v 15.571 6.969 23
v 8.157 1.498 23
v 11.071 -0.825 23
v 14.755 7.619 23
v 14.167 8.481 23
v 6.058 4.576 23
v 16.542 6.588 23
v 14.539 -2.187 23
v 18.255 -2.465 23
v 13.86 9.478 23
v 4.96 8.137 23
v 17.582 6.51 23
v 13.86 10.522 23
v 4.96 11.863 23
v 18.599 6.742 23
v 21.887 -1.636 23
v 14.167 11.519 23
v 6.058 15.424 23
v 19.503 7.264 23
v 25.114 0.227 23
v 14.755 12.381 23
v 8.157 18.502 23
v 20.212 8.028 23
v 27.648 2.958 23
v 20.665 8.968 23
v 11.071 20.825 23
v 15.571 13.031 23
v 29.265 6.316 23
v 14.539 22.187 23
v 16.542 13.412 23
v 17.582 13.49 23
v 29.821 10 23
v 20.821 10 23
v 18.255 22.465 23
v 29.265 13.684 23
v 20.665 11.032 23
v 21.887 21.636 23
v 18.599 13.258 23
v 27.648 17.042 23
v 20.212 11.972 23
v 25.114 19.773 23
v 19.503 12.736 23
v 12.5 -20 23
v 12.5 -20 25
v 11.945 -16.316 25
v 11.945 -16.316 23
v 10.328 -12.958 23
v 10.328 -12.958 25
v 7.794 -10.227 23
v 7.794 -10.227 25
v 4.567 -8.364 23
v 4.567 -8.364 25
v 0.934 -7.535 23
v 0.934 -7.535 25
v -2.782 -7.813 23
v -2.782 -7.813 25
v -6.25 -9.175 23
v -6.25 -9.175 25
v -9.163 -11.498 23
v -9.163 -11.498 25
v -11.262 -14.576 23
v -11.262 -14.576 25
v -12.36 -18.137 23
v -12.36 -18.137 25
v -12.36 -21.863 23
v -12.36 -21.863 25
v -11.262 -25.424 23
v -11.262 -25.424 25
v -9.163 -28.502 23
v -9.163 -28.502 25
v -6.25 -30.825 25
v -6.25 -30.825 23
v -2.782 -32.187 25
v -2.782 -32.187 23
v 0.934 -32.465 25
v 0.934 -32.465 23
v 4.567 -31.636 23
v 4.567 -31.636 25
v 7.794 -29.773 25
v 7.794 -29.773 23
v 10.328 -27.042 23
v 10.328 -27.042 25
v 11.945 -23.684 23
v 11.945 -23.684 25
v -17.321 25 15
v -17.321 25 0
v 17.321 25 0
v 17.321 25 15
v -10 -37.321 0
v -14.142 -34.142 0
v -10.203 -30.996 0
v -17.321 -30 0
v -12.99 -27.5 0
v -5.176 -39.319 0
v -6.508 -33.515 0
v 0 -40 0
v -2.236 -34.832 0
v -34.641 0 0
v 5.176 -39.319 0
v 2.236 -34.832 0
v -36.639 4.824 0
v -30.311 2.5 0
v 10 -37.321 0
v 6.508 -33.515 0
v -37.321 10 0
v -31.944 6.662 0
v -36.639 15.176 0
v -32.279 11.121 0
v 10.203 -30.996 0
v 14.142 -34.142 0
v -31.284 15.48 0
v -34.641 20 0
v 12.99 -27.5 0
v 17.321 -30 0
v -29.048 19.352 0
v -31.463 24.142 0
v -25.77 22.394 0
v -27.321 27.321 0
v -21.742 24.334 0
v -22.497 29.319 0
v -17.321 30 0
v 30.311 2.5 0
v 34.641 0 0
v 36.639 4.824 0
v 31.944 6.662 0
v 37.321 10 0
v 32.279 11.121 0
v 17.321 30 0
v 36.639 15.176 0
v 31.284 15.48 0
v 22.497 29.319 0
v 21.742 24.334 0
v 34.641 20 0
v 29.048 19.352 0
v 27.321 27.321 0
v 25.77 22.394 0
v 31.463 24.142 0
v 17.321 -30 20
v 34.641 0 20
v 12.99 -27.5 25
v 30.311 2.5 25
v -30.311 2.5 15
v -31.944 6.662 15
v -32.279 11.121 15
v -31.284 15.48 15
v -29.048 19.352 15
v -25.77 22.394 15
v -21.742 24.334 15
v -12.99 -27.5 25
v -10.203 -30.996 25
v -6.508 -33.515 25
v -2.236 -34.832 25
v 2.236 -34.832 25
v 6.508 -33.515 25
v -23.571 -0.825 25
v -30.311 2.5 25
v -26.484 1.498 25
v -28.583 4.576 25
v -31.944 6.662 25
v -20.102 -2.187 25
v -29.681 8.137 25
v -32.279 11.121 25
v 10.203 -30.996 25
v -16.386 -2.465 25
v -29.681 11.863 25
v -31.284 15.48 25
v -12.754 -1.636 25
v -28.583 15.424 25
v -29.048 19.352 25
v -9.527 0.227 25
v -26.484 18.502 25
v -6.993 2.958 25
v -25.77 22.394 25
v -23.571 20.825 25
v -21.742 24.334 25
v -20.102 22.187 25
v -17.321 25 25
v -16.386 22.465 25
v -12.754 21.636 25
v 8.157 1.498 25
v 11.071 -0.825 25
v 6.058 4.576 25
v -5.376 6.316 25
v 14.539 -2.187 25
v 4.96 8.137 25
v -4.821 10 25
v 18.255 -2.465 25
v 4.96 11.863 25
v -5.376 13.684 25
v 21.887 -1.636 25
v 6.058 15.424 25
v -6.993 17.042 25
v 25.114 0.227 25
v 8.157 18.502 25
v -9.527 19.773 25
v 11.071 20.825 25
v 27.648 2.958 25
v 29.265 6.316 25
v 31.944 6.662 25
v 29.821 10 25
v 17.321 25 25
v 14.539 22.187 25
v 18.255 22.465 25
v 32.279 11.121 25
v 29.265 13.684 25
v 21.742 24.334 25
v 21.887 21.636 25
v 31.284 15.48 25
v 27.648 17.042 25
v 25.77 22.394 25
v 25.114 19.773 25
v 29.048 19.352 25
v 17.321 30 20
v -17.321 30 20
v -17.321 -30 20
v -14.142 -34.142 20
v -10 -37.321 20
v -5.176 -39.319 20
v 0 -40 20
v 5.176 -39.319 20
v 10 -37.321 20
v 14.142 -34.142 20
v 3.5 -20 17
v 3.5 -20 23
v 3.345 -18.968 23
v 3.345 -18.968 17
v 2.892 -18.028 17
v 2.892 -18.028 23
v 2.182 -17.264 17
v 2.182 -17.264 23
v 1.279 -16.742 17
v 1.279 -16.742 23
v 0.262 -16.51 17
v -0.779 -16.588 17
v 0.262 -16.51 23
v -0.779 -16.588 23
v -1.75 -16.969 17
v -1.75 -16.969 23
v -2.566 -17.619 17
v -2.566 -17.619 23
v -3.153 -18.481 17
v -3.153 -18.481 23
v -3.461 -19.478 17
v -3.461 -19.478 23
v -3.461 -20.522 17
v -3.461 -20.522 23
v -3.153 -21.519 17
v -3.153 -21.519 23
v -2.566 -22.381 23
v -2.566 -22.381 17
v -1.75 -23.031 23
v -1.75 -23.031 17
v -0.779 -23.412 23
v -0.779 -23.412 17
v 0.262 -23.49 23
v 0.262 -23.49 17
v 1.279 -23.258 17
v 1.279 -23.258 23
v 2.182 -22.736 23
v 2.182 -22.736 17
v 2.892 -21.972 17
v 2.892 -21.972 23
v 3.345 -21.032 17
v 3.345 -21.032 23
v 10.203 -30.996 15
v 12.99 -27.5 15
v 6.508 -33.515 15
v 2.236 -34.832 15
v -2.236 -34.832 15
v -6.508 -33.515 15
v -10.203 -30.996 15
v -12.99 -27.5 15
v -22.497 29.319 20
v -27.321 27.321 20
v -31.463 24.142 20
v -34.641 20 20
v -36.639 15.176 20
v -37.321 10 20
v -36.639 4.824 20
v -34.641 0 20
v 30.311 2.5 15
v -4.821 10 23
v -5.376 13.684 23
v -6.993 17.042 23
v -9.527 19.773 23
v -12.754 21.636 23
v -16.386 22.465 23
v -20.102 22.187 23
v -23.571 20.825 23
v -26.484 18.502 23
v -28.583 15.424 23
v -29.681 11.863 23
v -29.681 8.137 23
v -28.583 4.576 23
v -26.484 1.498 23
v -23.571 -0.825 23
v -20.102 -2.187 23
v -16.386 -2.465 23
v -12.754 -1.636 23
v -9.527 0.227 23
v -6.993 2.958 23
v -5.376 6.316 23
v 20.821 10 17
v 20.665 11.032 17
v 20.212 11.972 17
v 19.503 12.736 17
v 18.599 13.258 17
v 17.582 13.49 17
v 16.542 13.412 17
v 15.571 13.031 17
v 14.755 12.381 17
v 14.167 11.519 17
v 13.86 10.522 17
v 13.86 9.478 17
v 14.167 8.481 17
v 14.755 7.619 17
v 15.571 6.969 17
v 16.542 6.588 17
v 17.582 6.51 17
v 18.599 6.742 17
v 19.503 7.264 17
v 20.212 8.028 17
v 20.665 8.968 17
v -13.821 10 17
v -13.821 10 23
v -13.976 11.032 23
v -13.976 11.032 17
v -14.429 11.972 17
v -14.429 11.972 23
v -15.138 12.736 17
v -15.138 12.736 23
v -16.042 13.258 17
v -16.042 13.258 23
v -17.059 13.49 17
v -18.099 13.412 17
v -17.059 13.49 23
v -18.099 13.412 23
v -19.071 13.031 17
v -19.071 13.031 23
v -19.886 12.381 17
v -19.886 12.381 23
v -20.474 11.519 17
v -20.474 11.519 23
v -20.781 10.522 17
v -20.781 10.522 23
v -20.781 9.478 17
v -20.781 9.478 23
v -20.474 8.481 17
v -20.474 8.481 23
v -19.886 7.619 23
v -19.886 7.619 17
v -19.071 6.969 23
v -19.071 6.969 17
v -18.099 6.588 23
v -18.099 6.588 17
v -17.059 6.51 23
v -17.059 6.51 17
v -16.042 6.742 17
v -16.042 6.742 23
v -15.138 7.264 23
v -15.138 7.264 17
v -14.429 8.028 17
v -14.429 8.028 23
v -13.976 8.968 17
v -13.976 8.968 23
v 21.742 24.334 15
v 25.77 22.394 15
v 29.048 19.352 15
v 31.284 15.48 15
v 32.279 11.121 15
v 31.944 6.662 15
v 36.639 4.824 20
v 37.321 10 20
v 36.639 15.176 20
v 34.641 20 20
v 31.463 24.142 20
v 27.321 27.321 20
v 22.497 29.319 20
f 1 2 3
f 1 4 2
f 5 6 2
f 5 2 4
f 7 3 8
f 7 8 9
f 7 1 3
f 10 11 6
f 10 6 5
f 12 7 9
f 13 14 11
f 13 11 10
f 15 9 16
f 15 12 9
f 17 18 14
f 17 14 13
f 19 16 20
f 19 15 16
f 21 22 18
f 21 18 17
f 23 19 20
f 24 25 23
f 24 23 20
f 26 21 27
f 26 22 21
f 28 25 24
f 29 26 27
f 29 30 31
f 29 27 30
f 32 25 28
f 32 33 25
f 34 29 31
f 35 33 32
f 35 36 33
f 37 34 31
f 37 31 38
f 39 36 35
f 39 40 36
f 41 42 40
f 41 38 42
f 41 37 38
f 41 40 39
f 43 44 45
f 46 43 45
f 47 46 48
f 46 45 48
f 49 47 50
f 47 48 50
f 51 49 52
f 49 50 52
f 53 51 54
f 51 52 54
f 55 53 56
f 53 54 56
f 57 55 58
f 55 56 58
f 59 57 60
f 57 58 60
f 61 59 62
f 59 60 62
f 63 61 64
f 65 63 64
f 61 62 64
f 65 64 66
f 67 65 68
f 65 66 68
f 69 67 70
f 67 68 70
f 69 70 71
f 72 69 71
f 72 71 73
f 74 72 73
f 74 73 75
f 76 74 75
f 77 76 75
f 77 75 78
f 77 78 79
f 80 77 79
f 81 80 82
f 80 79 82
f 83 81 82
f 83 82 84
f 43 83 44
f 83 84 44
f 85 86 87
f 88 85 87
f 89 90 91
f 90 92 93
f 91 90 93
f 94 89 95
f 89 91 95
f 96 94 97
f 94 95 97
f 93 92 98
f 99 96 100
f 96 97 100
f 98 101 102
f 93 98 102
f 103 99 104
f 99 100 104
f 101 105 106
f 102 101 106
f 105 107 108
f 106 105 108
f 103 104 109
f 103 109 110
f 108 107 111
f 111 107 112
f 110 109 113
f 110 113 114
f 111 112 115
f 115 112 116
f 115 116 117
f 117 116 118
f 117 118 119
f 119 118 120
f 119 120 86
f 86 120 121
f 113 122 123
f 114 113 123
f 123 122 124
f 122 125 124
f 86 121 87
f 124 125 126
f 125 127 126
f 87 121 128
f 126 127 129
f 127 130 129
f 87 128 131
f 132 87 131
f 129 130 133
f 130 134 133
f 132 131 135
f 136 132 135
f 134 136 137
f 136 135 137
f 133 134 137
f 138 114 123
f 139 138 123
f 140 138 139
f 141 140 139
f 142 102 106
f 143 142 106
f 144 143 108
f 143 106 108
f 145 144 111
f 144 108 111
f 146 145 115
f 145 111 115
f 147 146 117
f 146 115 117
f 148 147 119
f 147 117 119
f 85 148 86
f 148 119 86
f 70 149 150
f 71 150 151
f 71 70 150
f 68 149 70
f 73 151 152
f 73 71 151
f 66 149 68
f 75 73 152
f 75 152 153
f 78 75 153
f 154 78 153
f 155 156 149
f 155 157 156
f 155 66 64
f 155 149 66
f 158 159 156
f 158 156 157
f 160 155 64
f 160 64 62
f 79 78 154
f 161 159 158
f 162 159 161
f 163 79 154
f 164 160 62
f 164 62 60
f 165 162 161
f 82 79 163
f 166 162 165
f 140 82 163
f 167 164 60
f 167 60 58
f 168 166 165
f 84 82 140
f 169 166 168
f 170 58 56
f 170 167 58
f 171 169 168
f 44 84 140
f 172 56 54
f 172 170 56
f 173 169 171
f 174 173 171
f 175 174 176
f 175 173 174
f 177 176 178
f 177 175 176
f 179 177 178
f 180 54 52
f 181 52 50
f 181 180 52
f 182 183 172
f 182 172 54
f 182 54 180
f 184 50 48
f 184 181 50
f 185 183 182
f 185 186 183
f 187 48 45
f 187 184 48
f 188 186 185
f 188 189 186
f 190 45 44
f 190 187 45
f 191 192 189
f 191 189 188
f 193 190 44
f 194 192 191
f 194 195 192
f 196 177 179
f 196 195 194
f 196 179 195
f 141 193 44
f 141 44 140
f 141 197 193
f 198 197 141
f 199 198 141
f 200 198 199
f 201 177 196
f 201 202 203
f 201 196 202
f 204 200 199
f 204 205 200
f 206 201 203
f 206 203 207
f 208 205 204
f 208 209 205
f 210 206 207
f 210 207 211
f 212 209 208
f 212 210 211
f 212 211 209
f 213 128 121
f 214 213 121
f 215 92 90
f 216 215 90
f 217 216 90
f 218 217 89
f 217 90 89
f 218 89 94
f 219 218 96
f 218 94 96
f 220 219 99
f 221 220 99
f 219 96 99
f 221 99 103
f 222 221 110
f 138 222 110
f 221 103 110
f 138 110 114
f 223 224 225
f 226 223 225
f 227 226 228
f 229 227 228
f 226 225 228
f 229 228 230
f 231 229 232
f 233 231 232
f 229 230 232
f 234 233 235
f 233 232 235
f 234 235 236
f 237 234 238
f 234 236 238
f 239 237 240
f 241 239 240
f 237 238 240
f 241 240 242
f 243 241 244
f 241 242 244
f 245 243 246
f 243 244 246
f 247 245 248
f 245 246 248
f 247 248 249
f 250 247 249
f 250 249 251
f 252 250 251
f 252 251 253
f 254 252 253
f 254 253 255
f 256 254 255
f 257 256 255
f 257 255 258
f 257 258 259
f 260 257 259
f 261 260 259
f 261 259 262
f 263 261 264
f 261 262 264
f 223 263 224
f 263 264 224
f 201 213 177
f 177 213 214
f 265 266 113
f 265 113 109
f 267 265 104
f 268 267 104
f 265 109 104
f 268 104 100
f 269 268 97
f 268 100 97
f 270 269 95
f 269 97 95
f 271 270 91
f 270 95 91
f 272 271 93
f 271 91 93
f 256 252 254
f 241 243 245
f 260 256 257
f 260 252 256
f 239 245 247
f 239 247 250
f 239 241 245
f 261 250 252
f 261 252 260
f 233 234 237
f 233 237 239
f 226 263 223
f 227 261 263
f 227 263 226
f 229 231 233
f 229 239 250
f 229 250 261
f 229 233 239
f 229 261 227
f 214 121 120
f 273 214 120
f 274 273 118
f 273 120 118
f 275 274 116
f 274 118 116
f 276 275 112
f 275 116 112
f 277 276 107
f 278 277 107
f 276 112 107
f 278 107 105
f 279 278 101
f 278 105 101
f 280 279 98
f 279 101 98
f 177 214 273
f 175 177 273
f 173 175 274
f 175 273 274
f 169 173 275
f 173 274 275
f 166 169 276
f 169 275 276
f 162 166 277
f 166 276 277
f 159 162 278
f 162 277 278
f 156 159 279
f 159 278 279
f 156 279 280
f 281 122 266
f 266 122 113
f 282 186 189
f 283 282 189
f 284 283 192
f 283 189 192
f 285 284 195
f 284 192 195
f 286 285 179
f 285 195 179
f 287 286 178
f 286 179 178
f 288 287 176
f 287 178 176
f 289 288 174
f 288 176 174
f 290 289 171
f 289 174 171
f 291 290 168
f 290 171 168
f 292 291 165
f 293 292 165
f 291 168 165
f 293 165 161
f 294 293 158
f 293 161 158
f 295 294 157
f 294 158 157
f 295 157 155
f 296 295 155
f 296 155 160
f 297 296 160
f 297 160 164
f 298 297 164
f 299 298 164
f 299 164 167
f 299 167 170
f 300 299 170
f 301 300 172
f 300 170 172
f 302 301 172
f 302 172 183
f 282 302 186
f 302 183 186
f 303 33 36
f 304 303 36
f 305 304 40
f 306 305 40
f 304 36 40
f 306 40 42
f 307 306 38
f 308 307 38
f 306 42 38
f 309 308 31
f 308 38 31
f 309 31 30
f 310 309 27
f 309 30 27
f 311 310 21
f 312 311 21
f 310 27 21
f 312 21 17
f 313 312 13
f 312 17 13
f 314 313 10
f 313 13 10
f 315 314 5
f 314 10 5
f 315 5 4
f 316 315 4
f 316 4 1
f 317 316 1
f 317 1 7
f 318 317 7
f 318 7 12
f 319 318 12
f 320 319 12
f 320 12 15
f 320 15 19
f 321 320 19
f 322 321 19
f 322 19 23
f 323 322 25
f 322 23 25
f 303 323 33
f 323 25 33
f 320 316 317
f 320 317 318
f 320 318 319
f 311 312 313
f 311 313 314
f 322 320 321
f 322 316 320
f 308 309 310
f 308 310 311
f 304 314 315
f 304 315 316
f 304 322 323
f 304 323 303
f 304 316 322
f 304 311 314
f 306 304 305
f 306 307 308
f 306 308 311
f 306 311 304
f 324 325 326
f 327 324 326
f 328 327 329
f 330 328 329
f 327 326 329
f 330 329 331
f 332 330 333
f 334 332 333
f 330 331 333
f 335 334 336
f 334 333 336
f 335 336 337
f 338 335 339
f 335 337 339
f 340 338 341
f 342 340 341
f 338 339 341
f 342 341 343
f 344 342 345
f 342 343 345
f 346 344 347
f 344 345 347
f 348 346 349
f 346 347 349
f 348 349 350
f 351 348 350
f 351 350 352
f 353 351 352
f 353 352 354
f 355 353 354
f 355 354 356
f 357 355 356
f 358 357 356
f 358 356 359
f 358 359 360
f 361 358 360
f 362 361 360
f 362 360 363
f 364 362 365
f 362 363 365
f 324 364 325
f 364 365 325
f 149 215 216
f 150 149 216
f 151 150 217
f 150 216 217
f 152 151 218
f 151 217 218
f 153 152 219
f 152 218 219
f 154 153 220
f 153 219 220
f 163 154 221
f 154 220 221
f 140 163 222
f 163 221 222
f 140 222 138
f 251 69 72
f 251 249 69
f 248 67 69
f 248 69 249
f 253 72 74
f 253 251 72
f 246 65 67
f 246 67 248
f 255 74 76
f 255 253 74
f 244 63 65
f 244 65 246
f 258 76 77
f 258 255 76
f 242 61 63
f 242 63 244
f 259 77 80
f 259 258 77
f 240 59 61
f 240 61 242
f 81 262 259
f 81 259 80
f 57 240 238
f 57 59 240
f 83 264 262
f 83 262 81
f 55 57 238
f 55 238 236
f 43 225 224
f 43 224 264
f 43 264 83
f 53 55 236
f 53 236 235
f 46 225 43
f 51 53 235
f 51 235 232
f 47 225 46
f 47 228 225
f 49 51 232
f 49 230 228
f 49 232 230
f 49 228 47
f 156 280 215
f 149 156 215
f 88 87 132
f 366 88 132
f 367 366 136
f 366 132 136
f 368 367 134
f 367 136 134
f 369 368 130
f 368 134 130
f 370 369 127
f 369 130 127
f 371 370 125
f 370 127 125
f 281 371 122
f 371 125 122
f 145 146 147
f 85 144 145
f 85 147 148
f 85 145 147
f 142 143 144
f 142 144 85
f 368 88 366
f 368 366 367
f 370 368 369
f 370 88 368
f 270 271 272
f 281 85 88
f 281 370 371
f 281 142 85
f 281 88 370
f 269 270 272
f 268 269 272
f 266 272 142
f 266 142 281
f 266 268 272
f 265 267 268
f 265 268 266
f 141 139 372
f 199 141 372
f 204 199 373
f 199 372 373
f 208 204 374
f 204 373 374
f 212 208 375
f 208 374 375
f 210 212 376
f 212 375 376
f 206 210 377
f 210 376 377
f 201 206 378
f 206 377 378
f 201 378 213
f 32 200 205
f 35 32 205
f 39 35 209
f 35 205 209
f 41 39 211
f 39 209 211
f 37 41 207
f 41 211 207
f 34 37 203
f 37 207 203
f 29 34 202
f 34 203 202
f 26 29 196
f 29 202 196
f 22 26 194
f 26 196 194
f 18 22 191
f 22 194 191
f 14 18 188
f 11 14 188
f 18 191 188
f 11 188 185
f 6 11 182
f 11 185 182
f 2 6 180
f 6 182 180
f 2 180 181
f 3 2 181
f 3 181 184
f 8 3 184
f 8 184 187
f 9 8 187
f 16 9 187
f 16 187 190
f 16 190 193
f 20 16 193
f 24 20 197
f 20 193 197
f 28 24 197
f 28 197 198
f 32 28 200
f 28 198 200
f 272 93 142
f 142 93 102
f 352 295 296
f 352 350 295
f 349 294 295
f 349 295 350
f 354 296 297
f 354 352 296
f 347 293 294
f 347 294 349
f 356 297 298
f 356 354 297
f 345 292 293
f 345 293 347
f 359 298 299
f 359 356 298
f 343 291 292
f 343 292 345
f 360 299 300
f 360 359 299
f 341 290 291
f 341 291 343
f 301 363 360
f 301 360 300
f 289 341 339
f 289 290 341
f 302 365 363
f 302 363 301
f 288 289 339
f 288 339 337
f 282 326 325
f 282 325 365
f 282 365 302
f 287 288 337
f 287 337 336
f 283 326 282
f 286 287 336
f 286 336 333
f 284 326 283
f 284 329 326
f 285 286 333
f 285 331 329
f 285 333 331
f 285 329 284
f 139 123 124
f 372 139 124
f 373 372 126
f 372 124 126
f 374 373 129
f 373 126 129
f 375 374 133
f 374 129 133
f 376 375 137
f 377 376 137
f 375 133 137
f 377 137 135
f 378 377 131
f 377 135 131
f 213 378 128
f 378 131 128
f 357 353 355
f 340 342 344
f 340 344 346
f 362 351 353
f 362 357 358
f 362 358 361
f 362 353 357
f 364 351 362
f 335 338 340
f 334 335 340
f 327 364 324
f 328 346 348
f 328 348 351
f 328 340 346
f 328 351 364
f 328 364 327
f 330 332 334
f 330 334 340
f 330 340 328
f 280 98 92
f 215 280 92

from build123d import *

# Parameters (mm, degrees)
F1_DEPTH = 25
F2_R     = 12.5
F3_DEPTH = 2
F4_R     = 3.5
F5_DEPTH = 6
F6_SIZE  = 5
F8_DEPTH = 15


with BuildPart() as f1:
    # F0 (on Top) → F1 (new body)
    with BuildSketch(Plane.XY):
        with BuildLine():
            Line((17.320508, 30), (-17.320508, 30))
            ThreePointArc((-17.320508, 30), (-34.641016, 20), (-34.641016, 0))
            Line((-34.641016, 0), (-17.320508, -30))
            ThreePointArc((-17.320508, -30), (0, -40), (17.320508, -30))
            Line((17.320508, -30), (34.641016, 0))
            ThreePointArc((34.641016, 0), (34.641016, 20), (17.320508, 30))
        make_face()
    extrude(amount=F1_DEPTH)

    # F2 (on face) → F3 (cut)
    with BuildSketch(Plane.XY.offset(25)):
        with Locations((-17.320508, 10)):
            Circle(F2_R)
        with Locations((0, -20)):
            Circle(F2_R)
        with Locations((17.320508, 10)):
            Circle(F2_R)
    extrude(amount=-F3_DEPTH, mode=Mode.SUBTRACT)

    # F4 (on face) → F5 (cut)
    with BuildSketch(Plane.XY.offset(23)):
        with Locations((-17.320508, 10)):
            Circle(F4_R)
        with Locations((0, -20)):
            Circle(F4_R)
        with Locations((17.320508, 10)):
            Circle(F4_R)
    extrude(amount=-F5_DEPTH, mode=Mode.SUBTRACT)

    # F6
    f6_edges = [f1.edges().sort_by_distance(p)[0] for p in [
        (25.980762, -15, 25),
    ]]
    chamfer(f6_edges, length=F6_SIZE)

    # F7 (on face) → F8 (cut)
    with BuildSketch(Plane(origin=(0, 0, 0), x_dir=(1, 0, 0), z_dir=(0, 0, -1))):
        with BuildLine():
            ThreePointArc((12.990381, 27.5), (0, 35), (-12.990381, 27.5))
            Line((-12.990381, 27.5), (-30.310889, -2.5))
            ThreePointArc((-30.310889, -2.5), (-30.310889, -17.5), (-17.320508, -25))
            Line((-17.320508, -25), (17.320508, -25))
            ThreePointArc((17.320508, -25), (30.310889, -17.5), (30.310889, -2.5))
            Line((30.310889, -2.5), (12.990381, 27.5))
        make_face()
    extrude(amount=-F8_DEPTH, mode=Mode.SUBTRACT)


solid = f1.part
